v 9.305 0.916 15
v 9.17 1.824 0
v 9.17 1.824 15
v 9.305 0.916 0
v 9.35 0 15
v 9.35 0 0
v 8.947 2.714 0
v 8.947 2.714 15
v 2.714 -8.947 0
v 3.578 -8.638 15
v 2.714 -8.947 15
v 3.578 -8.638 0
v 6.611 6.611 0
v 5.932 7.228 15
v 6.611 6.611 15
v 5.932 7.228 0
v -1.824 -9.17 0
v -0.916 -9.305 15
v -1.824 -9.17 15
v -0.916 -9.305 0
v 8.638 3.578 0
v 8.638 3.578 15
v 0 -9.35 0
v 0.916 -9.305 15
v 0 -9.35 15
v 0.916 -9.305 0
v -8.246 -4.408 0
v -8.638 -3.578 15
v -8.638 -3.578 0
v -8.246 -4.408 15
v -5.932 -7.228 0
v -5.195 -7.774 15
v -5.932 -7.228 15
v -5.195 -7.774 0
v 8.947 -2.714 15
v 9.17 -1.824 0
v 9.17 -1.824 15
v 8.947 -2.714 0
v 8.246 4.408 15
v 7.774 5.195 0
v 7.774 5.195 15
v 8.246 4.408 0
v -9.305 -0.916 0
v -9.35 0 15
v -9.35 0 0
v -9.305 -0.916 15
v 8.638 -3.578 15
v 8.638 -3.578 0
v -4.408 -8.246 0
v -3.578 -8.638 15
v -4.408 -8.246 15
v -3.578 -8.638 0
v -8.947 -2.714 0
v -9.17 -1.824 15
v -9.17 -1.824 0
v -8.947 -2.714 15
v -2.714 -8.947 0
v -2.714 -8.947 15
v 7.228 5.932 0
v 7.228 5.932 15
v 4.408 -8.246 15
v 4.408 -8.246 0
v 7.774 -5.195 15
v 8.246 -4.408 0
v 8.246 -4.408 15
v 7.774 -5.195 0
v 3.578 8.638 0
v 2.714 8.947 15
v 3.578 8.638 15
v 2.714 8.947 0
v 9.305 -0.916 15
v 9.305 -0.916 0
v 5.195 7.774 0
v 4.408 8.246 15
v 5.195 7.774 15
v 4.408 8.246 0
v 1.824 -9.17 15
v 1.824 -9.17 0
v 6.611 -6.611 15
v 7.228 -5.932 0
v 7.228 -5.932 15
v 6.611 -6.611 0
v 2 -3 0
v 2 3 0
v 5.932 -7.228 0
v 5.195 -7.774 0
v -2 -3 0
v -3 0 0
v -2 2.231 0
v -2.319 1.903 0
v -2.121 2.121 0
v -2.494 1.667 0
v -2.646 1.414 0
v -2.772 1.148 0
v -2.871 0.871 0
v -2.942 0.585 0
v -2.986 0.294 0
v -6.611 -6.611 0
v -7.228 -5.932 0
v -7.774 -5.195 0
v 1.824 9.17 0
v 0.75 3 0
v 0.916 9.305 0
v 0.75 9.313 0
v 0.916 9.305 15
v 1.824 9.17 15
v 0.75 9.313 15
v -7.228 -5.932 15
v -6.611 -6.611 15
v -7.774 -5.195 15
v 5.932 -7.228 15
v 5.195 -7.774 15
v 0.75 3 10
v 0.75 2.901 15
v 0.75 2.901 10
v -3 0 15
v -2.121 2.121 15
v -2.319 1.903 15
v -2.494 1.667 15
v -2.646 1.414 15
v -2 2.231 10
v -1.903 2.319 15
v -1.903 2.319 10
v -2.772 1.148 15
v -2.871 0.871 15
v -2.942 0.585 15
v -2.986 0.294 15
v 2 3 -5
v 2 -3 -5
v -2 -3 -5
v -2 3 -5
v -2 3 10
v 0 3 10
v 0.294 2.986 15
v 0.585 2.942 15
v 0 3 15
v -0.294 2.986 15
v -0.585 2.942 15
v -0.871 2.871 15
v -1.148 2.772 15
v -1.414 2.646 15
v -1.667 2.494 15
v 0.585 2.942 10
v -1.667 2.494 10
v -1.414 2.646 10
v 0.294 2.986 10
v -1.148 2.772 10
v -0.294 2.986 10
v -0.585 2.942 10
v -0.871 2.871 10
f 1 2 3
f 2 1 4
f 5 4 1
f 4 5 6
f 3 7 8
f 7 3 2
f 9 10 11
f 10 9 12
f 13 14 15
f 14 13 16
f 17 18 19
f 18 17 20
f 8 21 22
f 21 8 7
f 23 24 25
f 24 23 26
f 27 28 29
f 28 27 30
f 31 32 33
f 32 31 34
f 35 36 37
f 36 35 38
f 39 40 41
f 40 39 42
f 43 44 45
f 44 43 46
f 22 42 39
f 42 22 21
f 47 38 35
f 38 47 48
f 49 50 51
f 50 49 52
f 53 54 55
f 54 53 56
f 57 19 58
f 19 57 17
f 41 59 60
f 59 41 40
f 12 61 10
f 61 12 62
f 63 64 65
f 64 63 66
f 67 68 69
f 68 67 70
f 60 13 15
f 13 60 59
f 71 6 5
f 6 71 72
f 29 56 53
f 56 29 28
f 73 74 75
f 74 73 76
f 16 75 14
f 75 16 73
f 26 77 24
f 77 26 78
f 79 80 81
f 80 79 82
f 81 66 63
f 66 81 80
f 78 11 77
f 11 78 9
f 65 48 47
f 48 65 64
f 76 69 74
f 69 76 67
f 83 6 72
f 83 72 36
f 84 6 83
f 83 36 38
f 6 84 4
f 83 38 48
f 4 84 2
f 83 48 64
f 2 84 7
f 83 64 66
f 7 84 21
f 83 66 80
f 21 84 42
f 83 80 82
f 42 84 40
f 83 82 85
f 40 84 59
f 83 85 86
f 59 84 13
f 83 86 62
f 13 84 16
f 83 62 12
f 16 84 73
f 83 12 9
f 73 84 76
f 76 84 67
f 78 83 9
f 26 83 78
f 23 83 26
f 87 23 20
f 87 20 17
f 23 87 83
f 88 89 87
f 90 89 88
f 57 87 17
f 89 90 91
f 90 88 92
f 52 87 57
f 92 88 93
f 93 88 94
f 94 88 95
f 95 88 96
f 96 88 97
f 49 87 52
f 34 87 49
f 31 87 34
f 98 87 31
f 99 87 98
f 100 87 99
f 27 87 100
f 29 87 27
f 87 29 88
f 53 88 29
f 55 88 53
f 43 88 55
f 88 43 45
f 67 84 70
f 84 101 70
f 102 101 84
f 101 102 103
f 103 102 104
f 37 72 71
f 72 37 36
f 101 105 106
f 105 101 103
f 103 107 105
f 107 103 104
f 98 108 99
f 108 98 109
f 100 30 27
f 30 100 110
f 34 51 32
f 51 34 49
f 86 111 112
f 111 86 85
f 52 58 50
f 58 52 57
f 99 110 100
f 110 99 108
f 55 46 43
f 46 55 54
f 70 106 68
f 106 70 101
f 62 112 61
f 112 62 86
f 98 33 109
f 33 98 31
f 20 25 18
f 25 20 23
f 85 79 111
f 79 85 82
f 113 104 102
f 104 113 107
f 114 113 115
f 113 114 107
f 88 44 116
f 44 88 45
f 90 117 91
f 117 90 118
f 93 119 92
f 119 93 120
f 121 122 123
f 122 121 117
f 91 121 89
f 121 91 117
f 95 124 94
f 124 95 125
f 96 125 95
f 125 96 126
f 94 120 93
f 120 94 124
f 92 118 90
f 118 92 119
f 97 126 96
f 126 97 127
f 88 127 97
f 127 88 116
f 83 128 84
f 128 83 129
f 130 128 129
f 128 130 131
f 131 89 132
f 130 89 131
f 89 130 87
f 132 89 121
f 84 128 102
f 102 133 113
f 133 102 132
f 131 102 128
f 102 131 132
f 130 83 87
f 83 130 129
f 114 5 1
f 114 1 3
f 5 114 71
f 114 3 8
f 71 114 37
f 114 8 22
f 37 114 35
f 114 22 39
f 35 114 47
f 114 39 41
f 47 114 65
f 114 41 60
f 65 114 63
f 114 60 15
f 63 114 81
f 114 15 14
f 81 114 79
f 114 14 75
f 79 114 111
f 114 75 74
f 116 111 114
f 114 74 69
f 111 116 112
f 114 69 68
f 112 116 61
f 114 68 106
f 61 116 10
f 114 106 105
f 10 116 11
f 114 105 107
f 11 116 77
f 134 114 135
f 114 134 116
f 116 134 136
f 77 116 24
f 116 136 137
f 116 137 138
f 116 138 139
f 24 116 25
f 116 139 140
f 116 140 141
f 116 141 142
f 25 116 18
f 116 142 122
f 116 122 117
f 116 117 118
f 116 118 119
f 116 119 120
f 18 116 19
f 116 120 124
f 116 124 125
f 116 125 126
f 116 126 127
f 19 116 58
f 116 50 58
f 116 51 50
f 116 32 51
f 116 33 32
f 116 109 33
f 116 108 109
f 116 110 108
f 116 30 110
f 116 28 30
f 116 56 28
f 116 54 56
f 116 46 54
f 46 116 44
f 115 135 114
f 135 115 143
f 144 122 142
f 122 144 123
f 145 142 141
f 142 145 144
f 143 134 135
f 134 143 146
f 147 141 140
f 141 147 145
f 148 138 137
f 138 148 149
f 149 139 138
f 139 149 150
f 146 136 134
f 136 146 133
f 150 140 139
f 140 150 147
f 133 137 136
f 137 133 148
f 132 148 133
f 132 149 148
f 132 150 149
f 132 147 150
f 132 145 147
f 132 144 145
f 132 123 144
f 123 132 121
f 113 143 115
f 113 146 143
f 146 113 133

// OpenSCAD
// Dimensions for the Snap-On Clip Design

// Overall part height
height_z = 10; // Total extrusion height in Z direction (mm)

// Rod Ring dimensions (Ring 1)
rod_ring_inner_diameter = 12.7; // Inner diameter of the rod ring (mm)
rod_ring_wall_thickness = 3;     // Wall thickness of the rod ring (mm)
rod_ring_outer_diameter = rod_ring_inner_diameter + 2 * rod_ring_wall_thickness; // Calculated outer diameter (18.7 mm)

// Tubing Ring dimensions (Ring 2)
tubing_ring_inner_diameter = 6;  // Inner diameter of the tubing ring (mm)
tubing_ring_wall_thickness = 2;  // Wall thickness of the tubing ring (mm)
tubing_ring_center_x = 15;       // Center X position for the tubing ring (mm)
tubing_ring_center_y = 0;        // Center Y position for the tubing ring (mm)

// Bridge dimensions (Solid Connector)
bridge_width_y = 6;              // Width of the solid bridge in the Y direction (mm)
bridge_start_x = 8;              // Start X position of the bridge (mm)
bridge_end_x = 12;               // End X position of the bridge (mm)

// Cutout dimensions for Ring 1 (Rod Snap)
rod_cutout_width = 10;           // Width of the opening cut out on the -X side (mm)
rod_cutout_y_range = [-5, 5];     // Y range for the cutout on Ring 1

// Cutout dimensions for Ring 2 (Tubing Alignment)
tubing_cutout_width = 4.5;        // Width of the opening cut out on the +X side (mm)
tubing_cutout_y_range = [-2.25, 2.25]; // Y range for the cutout on Ring 2

// Tolerance for cuts (to ensure separation)
tolerance = 0.1; // Small offset for cutting operations

// --- Module Definitions ---

module rod_ring() {
    difference() {
        // Base ring shape (Outer circle)
        cylinder(h = height_z, r = rod_ring_outer_diameter / 2, $fn = 64);

        // Cutout for snapping onto the rod (on the -X side)
        translate([-(rod_ring_outer_diameter / 2) - tolerance, 0, 0]) {
            cube([rod_cutout_width + 2 * tolerance, 10, height_z]); // Cut a block extending past the edge
        }
    }
}

module tubing_ring() {
    difference() {
        // Base ring shape (Outer circle)
        cylinder(h = height_z, r = tubing_ring_inner_diameter / 2, $fn = 64);

        // Cutout for tubing alignment (on the +X side)
        translate([tubing_ring_center_x + tubing_ring_wall_thickness + tolerance, 0, 0]) {
            cube([tubing_cutout_width + 2 * tolerance, 10, height_z]); // Cut a block extending past the edge
        }
    }
}

module bridge() {
    // Solid rectangular bridge connecting the rings
    cube([bridge_end_x - bridge_start_x, bridge_width_y, height_z], center = true);
}

// --- Main Assembly ---

union() {
    rod_ring();
    tubing_ring();
    bridge();
}

// Apply translation to lift the entire assembly so its lowest point is at Z=0.
translate([0, 0, 5]) {
    union() {
        rod_ring();
        tubing_ring();
        bridge();
    }
}
